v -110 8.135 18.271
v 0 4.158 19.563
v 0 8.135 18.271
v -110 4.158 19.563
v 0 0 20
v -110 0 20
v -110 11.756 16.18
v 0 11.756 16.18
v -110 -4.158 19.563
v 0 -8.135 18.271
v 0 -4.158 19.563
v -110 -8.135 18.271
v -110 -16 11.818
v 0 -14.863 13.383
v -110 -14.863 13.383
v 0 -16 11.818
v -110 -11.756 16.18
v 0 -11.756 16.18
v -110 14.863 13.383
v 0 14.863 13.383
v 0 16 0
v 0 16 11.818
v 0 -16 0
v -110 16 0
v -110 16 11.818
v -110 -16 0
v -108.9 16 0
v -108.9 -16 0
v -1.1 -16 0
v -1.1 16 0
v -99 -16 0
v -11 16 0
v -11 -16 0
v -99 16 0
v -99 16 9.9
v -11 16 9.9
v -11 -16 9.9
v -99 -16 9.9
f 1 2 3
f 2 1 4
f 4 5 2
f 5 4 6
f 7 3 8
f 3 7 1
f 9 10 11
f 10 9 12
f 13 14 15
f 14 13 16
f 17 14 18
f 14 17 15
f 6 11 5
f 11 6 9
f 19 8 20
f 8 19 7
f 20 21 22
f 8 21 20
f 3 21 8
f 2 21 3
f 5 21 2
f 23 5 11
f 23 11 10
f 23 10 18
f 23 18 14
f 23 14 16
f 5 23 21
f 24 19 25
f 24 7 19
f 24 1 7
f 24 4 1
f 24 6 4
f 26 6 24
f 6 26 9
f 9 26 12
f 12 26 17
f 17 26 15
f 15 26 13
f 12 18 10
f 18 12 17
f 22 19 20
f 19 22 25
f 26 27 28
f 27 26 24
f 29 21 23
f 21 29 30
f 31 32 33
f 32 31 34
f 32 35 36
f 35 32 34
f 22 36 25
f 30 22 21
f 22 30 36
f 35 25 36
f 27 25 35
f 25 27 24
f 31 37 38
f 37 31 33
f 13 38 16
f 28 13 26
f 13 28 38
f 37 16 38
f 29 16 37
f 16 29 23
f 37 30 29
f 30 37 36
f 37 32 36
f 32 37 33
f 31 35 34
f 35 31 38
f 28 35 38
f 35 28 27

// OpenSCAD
type = 2;
width = 25;
height = 130;
length = 145;
thickness = 8;
hole_size = 2.5;
bar_size = 32;
bar_radius = 20;
bar_length = 110; // 110 for most spools
hook_size = bar_size + thickness * 2;

if (type == 0 || type == 1) {
rotate([0,-90,0]) {
translate([0, -20, 0])
{
	difference() {
		// upright
		cube([width, height, thickness]);

		// screw holes
		translate([width / 2, width / 2, -.1])
			cylinder(h = thickness + .2, r = hole_size, $fn = 10);
		translate([width / 2, height - width / 2, -.1])
			cylinder(h = thickness + .2, r = hole_size, $fn = 10);
	}
}
// lower bar
translate([0, 0, thickness])
	if (type == 0)
	rotate([-28, 0, 0])
		cube([width, thickness, length - hook_size + 44]);
	else
	rotate([-35, 0, 0])
		cube([width, thickness, length - hook_size + 17]);

// upper bar
translate([0, height - 40 - thickness, 0])
	cube([width, thickness, length - hook_size]);
// hook
translate([0, height - 65, length - hook_size])
{
	union()
	{
		if (type == 0) {
		difference() {
			cube([width, 25, hook_size]);
			translate([-.1, thickness, thickness - 1])
				cube([width + .2, 20, bar_size + 2]);
		}
		translate([0,thickness,0])
			linear_extrude(height = hook_size)
				polygon([[0,0],[10,0],[0,10]]);
		translate([width, thickness, 0])
			linear_extrude(height = hook_size)
				polygon([[0,0],[-10,0],[0,10]]);
		}
		else {
		difference() {
			cube([width, 25, hook_size]);
			translate([-.1, -.1, thickness - 1])
				cube([width + .2, 20, bar_size + 2]);
		}
		translate([0,20,0])
			linear_extrude(height = hook_size)
				polygon([[0,0],[10,0],[0,-10]]);
		translate([width, 20, 0])
			linear_extrude(height = hook_size)
				polygon([[0,0],[-10,0],[0,-10]]);
		}
	}
}
}
}
else {
	difference() {
	rotate([0, -90, 0])
		intersection() {
			cylinder(h = bar_length, r = bar_radius);
			translate([0, - bar_size / 2, 0])
				cube([bar_size, bar_size, bar_length]);
	}
	translate([-11, bar_size / 2 + .1, -.1])
		rotate([90, 0, 0])
			linear_extrude(height = bar_size + .2)
				polygon([[0,0],[10,0],[0,10]]);
	
	translate([-bar_length + 11, bar_size / 2 + .1, -.1])
		rotate([90, 0, 0])
			linear_extrude(height = bar_size + .2)
				polygon([[0, 0], [-10, 0], [0, 10]]);
	}
}
